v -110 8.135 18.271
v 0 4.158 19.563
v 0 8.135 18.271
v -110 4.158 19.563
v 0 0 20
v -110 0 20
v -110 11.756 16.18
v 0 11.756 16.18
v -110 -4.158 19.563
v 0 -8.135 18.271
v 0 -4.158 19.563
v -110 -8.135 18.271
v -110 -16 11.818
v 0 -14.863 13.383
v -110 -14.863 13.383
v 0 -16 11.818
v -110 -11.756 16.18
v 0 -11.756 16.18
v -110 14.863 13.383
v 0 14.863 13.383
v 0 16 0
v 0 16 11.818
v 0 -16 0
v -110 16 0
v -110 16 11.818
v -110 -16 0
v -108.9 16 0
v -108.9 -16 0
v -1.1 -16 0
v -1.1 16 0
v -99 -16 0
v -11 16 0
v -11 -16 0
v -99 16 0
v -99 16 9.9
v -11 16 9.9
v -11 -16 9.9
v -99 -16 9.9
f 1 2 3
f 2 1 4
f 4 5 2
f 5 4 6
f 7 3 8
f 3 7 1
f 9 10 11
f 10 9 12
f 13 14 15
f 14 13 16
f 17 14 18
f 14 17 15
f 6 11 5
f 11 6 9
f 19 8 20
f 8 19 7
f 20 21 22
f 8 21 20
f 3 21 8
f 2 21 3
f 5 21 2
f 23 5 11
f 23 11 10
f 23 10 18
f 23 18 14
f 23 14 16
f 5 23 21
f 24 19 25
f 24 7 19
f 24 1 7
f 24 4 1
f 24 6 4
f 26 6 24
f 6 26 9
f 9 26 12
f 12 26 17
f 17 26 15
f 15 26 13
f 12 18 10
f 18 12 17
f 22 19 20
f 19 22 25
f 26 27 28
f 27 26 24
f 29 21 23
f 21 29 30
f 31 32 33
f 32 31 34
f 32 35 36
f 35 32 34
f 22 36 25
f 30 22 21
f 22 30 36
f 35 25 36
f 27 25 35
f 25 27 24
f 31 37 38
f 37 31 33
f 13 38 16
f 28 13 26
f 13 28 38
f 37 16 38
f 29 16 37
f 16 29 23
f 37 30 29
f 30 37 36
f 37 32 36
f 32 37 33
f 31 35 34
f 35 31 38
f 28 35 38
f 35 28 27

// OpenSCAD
type = 2;
width = 25;
height = 130;
length = 145;
thickness = 8;
hole_size = 2.5;
bar_size = 32;
bar_radius = 20;
bar_length = 110; // 110 for most spools
hook_size = bar_size + thickness * 2;

if (type == 0 || type == 1) {
rotate([0,-90,0]) {
translate([0, -20, 0])
{
	difference() {
		// upright
		cube([width, height, thickness]);

		// screw holes
		translate([width / 2, width / 2, -.1])
			cylinder(h = thickness + .2, r = hole_size, $fn = 10);
		translate([width / 2, height - width / 2, -.1])
			cylinder(h = thickness + .2, r = hole_size, $fn = 10);
	}
}
// lower bar
translate([0, 0, thickness])
	if (type == 0)
	rotate([-28, 0, 0])
		cube([width, thickness, length - hook_size + 44]);
	else
	rotate([-35, 0, 0])
		cube([width, thickness, length - hook_size + 17]);

// upper bar
translate([0, height - 40 - thickness, 0])
	cube([width, thickness, length - hook_size]);
// hook
translate([0, height - 65, length - hook_size])
{
	union()
	{
		if (type == 0) {
		difference() {
			cube([width, 25, hook_size]);
			translate([-.1, thickness, thickness - 1])
				cube([width + .2, 20, bar_size + 2]);
		}
		translate([0,thickness,0])
			linear_extrude(height = hook_size)
				polygon([[0,0],[10,0],[0,10]]);
		translate([width, thickness, 0])
			linear_extrude(height = hook_size)
				polygon([[0,0],[-10,0],[0,10]]);
		}
		else {
		difference() {
			cube([width, 25, hook_size]);
			translate([-.1, -.1, thickness - 1])
				cube([width + .2, 20, bar_size + 2]);
		}
		translate([0,20,0])
			linear_extrude(height = hook_size)
				polygon([[0,0],[10,0],[0,-10]]);
		translate([width, 20, 0])
			linear_extrude(height = hook_size)
				polygon([[0,0],[-10,0],[0,-10]]);
		}
	}
}
}
}
else {
	difference() {
	rotate([0, -90, 0])
		intersection() {
			cylinder(h = bar_length, r = bar_radius);
			translate([0, - bar_size / 2, 0])
				cube([bar_size, bar_size, bar_length]);
	}
	translate([-11, bar_size / 2 + .1, -.1])
		rotate([90, 0, 0])
			linear_extrude(height = bar_size + .2)
				polygon([[0,0],[10,0],[0,10]]);
	
	translate([-bar_length + 11, bar_size / 2 + .1, -.1])
		rotate([90, 0, 0])
			linear_extrude(height = bar_size + .2)
				polygon([[0, 0], [-10, 0], [0, 10]]);
	}
}
